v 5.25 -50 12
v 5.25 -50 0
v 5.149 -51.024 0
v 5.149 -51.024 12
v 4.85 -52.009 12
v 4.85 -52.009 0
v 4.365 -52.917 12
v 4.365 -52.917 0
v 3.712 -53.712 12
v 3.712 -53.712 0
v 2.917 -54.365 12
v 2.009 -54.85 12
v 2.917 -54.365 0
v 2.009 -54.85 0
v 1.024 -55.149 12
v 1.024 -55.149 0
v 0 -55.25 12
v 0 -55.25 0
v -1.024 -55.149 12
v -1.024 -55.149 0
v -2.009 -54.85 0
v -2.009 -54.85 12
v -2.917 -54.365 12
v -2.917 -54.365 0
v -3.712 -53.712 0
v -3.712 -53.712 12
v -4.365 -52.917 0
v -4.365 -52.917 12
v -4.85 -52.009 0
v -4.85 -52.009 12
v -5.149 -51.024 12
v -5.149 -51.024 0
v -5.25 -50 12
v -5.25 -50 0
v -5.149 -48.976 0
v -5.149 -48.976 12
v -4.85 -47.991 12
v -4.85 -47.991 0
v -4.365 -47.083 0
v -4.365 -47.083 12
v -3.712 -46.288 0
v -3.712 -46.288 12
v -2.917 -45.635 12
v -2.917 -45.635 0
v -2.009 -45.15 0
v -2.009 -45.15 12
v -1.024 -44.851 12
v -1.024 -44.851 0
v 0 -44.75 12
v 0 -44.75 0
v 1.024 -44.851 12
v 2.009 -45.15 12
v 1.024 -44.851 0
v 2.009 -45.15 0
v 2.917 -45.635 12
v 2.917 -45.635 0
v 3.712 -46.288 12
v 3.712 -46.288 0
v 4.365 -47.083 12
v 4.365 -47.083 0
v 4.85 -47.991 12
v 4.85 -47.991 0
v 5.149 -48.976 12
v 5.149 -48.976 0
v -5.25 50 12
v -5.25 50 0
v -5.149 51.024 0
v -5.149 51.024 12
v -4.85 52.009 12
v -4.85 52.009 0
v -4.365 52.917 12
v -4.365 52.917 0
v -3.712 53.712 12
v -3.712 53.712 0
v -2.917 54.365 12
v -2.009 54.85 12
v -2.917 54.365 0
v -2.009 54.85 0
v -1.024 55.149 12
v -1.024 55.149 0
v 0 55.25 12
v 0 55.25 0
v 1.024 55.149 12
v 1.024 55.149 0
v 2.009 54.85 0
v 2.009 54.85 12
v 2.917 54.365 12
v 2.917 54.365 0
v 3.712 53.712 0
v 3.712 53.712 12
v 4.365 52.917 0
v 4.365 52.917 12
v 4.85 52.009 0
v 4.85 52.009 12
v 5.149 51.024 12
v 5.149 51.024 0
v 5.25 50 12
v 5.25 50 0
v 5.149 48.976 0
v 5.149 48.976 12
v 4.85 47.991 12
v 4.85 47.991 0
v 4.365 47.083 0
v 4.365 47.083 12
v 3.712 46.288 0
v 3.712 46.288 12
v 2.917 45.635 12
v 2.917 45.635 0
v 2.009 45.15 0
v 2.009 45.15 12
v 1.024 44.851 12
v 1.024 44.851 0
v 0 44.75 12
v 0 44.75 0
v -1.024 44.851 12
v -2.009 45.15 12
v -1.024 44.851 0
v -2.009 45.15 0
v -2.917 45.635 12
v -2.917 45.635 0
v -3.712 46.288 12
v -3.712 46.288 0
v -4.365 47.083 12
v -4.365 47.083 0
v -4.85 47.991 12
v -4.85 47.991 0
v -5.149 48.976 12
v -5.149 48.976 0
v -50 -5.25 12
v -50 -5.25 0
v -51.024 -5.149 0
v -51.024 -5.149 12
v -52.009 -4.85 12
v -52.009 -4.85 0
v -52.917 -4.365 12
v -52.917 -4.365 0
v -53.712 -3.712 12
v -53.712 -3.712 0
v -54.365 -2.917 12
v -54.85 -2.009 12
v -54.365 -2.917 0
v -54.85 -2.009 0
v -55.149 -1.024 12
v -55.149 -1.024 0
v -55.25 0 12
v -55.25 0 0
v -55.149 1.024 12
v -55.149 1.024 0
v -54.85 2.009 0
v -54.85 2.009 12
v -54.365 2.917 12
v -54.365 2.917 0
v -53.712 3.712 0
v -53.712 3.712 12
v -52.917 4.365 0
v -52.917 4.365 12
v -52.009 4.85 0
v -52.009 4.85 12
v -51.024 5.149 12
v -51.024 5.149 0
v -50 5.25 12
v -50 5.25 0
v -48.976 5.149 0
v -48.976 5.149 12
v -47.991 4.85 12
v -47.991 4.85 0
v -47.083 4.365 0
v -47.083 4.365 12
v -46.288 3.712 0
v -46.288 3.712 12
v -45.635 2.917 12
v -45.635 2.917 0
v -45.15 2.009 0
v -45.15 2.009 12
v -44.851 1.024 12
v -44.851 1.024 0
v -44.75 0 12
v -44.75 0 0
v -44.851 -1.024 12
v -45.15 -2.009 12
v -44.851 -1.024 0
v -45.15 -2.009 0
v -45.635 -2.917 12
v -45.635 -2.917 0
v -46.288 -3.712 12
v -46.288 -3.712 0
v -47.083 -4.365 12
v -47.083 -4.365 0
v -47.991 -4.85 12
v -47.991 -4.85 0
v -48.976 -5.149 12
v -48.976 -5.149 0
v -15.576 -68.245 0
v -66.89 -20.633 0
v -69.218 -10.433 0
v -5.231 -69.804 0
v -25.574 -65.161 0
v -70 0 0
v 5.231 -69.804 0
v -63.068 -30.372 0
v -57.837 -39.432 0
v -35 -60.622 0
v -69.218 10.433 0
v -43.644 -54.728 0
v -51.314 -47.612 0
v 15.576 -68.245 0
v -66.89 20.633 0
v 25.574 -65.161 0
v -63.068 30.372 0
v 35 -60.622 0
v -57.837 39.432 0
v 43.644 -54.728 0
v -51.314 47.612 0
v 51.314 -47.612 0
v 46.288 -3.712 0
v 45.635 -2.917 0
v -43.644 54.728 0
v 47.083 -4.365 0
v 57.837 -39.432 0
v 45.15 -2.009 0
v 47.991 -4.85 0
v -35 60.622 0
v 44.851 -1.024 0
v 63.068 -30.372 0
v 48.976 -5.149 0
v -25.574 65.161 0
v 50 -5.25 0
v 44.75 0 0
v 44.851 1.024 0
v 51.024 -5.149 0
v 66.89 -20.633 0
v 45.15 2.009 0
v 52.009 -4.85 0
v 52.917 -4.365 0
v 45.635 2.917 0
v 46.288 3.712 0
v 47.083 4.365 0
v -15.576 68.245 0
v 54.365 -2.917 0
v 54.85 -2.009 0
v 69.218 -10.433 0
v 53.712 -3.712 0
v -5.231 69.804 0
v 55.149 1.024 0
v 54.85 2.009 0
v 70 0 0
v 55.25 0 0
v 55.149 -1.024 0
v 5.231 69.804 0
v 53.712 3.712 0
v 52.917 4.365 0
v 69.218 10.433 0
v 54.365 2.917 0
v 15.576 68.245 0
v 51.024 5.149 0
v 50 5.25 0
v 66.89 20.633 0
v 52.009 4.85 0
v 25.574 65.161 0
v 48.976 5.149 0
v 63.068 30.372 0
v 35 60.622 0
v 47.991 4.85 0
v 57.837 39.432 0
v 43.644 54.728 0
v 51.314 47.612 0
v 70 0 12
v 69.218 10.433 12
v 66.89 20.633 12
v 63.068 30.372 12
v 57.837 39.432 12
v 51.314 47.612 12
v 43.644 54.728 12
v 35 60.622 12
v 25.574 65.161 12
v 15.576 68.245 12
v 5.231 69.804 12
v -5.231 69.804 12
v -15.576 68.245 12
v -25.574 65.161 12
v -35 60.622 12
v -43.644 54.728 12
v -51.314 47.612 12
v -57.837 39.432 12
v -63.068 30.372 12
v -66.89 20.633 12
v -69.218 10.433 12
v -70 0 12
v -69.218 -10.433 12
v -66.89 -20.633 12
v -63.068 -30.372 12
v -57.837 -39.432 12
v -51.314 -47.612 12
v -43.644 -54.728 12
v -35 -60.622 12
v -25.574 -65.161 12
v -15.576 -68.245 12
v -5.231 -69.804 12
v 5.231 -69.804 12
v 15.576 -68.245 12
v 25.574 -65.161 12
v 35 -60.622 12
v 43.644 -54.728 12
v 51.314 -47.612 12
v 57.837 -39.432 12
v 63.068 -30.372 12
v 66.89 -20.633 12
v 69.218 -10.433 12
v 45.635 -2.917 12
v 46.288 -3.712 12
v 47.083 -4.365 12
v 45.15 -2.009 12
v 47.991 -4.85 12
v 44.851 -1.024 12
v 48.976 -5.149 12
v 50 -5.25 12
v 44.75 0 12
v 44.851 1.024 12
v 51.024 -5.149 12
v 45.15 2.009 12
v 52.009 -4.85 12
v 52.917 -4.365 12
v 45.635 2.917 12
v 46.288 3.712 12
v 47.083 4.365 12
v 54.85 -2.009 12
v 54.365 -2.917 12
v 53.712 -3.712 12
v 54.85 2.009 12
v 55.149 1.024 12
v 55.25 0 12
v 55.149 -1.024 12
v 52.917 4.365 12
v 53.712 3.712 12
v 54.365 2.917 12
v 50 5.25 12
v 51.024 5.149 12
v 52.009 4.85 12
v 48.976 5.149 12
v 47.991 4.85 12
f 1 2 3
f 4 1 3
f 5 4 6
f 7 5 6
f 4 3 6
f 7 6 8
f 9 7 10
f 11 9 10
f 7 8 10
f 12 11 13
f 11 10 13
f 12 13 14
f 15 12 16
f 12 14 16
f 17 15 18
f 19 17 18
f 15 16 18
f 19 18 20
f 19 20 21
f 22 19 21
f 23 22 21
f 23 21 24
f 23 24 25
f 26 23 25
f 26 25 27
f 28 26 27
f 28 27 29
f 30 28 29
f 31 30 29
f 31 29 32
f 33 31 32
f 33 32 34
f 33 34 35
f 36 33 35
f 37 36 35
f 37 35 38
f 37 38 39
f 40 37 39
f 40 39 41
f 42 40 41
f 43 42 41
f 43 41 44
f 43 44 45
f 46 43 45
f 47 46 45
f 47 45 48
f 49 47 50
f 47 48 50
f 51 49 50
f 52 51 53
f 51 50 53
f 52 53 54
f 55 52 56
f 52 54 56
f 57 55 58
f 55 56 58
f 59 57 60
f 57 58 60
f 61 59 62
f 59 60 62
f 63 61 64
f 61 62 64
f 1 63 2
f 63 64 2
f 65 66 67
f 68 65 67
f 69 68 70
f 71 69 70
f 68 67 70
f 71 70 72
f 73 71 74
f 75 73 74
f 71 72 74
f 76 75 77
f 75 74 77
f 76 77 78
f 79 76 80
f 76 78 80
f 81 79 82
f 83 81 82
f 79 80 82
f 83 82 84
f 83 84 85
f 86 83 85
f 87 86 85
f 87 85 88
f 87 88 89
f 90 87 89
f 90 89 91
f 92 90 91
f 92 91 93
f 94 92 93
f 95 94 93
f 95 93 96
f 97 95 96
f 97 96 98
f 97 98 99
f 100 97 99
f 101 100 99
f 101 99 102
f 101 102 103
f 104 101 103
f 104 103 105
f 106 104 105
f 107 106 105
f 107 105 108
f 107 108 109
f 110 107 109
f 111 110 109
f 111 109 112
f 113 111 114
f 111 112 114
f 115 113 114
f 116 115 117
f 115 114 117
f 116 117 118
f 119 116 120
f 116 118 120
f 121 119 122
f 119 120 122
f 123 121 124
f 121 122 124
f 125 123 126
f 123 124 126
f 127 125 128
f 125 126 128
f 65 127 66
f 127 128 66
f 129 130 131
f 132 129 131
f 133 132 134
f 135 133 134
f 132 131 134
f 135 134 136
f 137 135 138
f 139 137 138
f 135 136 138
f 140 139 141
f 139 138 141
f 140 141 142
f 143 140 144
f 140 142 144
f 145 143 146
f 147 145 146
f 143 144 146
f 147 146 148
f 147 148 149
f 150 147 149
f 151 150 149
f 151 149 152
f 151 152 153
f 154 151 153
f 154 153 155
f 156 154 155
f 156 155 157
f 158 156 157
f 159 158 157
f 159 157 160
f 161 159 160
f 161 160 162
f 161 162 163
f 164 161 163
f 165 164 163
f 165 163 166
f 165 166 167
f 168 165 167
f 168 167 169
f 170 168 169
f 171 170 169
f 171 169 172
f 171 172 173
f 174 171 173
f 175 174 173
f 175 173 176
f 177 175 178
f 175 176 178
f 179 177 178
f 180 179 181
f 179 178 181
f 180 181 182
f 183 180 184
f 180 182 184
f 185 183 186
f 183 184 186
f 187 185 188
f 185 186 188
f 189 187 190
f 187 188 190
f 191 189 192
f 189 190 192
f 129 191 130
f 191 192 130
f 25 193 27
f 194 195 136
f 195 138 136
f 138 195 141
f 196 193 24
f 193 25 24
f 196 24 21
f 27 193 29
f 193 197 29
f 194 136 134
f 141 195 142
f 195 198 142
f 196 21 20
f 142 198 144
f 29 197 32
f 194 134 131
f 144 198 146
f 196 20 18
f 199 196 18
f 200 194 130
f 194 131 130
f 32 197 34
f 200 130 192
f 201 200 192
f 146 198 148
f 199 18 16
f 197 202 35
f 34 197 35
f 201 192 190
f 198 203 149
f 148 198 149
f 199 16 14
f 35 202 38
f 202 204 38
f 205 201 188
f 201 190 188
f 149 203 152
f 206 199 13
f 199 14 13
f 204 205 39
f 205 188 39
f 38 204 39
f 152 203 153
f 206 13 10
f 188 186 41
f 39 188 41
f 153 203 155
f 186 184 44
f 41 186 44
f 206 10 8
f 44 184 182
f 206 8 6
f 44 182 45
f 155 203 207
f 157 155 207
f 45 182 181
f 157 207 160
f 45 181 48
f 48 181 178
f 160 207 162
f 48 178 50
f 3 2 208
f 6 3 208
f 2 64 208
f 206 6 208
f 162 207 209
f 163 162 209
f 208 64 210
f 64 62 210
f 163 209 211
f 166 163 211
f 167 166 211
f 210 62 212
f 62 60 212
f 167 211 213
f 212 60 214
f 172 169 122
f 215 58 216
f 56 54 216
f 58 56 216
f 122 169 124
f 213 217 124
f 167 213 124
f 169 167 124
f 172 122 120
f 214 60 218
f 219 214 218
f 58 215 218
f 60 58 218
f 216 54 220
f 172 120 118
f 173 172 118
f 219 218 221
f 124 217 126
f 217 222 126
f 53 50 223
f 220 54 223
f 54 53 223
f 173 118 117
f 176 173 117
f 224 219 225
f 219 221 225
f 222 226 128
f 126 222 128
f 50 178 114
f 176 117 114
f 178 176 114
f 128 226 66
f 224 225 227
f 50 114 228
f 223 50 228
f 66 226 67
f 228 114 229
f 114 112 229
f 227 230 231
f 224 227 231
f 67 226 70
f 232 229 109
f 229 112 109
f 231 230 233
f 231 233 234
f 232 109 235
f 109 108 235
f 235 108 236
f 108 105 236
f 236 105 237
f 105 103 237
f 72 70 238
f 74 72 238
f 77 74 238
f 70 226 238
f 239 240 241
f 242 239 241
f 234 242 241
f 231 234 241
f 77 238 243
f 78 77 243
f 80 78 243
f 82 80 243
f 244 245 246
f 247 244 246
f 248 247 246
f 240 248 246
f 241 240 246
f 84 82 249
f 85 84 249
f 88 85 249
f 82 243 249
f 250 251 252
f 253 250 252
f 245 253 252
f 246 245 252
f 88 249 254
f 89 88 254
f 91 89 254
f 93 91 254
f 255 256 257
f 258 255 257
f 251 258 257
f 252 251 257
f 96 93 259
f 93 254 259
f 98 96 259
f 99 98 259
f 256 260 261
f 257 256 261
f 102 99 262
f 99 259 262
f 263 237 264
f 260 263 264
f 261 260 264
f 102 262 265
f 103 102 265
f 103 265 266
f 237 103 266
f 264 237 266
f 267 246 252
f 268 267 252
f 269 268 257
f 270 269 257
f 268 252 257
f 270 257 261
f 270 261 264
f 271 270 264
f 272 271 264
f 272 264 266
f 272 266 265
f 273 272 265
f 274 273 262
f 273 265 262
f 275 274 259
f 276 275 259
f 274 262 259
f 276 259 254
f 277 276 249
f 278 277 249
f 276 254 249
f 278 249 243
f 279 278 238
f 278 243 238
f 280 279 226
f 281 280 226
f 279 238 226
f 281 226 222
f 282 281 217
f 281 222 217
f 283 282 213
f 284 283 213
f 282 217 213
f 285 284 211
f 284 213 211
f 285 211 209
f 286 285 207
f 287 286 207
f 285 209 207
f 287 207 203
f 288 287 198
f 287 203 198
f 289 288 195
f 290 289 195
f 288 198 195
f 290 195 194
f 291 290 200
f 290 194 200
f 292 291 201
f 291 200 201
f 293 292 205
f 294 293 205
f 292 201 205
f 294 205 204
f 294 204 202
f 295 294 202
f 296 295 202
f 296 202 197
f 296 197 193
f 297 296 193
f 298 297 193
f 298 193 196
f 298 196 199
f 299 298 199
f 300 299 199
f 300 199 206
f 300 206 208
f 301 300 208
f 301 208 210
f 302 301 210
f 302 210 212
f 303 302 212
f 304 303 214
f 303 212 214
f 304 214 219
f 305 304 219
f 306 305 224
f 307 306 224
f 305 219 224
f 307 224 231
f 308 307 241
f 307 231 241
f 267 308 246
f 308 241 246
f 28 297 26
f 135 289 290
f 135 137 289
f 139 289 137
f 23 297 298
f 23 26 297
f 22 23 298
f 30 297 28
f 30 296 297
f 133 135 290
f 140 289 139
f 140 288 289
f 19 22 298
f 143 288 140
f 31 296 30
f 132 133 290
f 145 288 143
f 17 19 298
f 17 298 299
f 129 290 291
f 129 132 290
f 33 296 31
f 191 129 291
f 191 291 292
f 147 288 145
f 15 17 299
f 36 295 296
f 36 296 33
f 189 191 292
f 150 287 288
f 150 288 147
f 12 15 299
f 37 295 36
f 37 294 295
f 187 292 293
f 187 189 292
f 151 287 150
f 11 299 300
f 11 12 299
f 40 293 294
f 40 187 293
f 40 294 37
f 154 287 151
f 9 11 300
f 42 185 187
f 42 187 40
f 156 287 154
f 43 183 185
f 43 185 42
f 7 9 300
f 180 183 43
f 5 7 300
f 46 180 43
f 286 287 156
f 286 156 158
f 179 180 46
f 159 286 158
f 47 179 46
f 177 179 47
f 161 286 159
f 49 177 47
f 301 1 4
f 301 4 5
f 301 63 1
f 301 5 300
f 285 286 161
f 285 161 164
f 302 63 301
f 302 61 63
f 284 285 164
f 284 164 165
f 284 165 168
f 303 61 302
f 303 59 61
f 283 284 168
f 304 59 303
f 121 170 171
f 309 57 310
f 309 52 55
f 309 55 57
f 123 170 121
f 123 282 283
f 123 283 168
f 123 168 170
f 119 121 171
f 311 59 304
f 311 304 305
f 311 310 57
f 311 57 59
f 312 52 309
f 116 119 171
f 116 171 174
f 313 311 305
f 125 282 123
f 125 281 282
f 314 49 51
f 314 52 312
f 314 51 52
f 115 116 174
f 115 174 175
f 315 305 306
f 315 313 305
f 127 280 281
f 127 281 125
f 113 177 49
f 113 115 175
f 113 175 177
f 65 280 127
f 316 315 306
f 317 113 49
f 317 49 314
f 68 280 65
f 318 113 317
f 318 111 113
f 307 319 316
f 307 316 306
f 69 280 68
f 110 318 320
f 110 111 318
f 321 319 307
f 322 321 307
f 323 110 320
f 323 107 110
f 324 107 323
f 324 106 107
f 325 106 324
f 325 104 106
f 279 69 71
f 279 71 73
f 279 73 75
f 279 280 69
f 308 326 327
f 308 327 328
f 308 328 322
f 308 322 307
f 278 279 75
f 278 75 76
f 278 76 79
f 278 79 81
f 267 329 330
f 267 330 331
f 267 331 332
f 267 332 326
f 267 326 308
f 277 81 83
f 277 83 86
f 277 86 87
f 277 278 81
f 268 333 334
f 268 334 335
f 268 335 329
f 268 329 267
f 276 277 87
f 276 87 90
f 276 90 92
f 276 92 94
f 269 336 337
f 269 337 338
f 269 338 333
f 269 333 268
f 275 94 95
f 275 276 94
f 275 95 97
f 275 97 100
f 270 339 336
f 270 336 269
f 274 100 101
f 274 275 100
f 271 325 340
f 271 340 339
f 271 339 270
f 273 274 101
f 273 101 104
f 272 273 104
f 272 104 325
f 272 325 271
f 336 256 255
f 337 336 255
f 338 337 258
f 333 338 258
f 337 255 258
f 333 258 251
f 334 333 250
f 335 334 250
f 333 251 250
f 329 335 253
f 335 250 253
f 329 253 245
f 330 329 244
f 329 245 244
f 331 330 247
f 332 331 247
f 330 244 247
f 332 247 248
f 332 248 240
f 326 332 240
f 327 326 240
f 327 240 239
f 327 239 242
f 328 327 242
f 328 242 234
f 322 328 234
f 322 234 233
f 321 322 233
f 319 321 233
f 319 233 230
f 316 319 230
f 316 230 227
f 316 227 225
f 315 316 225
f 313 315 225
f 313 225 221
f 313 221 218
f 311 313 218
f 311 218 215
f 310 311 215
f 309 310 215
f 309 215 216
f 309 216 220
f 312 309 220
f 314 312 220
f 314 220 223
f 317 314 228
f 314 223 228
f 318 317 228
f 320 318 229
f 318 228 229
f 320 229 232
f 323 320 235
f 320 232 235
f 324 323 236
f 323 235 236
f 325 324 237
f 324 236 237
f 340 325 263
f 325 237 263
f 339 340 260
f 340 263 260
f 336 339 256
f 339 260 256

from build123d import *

# Parameters (mm, degrees)
SKETCH1_R                    = 70
BOSS_EXTRUDE1_DEPTH          = 12
TAP_DRILL_FOR_M12X1_5_TAP1_D = 10.5
CIRPATTERN1_COUNT            = 4


with BuildPart() as part:
    # Sketch1 → Boss-Extrude1 (new body)
    with BuildSketch(Plane.XY):
        Circle(SKETCH1_R)
    extrude(amount=BOSS_EXTRUDE1_DEPTH)

    # Tap Drill for M12x1.5 Tap1 (through all)
    with Locations(Plane(origin=(0, 50, 12), x_dir=(1, 0, 0), z_dir=(0, 0, 1))):
        with Locations((0, 0)):
            tap_drill_for_m12x1_5_tap1 = Hole(TAP_DRILL_FOR_M12X1_5_TAP1_D / 2)

    # CirPattern1: Tap Drill for M12x1.5 Tap1 ×4 about axis
    cirpattern1_axis = Axis((0, 0, 0), (0, 0, 1))
    for i in range(1, CIRPATTERN1_COUNT):
        add(tap_drill_for_m12x1_5_tap1.rotate(cirpattern1_axis, i * 360 / CIRPATTERN1_COUNT), mode=Mode.SUBTRACT)


solid = part.part
